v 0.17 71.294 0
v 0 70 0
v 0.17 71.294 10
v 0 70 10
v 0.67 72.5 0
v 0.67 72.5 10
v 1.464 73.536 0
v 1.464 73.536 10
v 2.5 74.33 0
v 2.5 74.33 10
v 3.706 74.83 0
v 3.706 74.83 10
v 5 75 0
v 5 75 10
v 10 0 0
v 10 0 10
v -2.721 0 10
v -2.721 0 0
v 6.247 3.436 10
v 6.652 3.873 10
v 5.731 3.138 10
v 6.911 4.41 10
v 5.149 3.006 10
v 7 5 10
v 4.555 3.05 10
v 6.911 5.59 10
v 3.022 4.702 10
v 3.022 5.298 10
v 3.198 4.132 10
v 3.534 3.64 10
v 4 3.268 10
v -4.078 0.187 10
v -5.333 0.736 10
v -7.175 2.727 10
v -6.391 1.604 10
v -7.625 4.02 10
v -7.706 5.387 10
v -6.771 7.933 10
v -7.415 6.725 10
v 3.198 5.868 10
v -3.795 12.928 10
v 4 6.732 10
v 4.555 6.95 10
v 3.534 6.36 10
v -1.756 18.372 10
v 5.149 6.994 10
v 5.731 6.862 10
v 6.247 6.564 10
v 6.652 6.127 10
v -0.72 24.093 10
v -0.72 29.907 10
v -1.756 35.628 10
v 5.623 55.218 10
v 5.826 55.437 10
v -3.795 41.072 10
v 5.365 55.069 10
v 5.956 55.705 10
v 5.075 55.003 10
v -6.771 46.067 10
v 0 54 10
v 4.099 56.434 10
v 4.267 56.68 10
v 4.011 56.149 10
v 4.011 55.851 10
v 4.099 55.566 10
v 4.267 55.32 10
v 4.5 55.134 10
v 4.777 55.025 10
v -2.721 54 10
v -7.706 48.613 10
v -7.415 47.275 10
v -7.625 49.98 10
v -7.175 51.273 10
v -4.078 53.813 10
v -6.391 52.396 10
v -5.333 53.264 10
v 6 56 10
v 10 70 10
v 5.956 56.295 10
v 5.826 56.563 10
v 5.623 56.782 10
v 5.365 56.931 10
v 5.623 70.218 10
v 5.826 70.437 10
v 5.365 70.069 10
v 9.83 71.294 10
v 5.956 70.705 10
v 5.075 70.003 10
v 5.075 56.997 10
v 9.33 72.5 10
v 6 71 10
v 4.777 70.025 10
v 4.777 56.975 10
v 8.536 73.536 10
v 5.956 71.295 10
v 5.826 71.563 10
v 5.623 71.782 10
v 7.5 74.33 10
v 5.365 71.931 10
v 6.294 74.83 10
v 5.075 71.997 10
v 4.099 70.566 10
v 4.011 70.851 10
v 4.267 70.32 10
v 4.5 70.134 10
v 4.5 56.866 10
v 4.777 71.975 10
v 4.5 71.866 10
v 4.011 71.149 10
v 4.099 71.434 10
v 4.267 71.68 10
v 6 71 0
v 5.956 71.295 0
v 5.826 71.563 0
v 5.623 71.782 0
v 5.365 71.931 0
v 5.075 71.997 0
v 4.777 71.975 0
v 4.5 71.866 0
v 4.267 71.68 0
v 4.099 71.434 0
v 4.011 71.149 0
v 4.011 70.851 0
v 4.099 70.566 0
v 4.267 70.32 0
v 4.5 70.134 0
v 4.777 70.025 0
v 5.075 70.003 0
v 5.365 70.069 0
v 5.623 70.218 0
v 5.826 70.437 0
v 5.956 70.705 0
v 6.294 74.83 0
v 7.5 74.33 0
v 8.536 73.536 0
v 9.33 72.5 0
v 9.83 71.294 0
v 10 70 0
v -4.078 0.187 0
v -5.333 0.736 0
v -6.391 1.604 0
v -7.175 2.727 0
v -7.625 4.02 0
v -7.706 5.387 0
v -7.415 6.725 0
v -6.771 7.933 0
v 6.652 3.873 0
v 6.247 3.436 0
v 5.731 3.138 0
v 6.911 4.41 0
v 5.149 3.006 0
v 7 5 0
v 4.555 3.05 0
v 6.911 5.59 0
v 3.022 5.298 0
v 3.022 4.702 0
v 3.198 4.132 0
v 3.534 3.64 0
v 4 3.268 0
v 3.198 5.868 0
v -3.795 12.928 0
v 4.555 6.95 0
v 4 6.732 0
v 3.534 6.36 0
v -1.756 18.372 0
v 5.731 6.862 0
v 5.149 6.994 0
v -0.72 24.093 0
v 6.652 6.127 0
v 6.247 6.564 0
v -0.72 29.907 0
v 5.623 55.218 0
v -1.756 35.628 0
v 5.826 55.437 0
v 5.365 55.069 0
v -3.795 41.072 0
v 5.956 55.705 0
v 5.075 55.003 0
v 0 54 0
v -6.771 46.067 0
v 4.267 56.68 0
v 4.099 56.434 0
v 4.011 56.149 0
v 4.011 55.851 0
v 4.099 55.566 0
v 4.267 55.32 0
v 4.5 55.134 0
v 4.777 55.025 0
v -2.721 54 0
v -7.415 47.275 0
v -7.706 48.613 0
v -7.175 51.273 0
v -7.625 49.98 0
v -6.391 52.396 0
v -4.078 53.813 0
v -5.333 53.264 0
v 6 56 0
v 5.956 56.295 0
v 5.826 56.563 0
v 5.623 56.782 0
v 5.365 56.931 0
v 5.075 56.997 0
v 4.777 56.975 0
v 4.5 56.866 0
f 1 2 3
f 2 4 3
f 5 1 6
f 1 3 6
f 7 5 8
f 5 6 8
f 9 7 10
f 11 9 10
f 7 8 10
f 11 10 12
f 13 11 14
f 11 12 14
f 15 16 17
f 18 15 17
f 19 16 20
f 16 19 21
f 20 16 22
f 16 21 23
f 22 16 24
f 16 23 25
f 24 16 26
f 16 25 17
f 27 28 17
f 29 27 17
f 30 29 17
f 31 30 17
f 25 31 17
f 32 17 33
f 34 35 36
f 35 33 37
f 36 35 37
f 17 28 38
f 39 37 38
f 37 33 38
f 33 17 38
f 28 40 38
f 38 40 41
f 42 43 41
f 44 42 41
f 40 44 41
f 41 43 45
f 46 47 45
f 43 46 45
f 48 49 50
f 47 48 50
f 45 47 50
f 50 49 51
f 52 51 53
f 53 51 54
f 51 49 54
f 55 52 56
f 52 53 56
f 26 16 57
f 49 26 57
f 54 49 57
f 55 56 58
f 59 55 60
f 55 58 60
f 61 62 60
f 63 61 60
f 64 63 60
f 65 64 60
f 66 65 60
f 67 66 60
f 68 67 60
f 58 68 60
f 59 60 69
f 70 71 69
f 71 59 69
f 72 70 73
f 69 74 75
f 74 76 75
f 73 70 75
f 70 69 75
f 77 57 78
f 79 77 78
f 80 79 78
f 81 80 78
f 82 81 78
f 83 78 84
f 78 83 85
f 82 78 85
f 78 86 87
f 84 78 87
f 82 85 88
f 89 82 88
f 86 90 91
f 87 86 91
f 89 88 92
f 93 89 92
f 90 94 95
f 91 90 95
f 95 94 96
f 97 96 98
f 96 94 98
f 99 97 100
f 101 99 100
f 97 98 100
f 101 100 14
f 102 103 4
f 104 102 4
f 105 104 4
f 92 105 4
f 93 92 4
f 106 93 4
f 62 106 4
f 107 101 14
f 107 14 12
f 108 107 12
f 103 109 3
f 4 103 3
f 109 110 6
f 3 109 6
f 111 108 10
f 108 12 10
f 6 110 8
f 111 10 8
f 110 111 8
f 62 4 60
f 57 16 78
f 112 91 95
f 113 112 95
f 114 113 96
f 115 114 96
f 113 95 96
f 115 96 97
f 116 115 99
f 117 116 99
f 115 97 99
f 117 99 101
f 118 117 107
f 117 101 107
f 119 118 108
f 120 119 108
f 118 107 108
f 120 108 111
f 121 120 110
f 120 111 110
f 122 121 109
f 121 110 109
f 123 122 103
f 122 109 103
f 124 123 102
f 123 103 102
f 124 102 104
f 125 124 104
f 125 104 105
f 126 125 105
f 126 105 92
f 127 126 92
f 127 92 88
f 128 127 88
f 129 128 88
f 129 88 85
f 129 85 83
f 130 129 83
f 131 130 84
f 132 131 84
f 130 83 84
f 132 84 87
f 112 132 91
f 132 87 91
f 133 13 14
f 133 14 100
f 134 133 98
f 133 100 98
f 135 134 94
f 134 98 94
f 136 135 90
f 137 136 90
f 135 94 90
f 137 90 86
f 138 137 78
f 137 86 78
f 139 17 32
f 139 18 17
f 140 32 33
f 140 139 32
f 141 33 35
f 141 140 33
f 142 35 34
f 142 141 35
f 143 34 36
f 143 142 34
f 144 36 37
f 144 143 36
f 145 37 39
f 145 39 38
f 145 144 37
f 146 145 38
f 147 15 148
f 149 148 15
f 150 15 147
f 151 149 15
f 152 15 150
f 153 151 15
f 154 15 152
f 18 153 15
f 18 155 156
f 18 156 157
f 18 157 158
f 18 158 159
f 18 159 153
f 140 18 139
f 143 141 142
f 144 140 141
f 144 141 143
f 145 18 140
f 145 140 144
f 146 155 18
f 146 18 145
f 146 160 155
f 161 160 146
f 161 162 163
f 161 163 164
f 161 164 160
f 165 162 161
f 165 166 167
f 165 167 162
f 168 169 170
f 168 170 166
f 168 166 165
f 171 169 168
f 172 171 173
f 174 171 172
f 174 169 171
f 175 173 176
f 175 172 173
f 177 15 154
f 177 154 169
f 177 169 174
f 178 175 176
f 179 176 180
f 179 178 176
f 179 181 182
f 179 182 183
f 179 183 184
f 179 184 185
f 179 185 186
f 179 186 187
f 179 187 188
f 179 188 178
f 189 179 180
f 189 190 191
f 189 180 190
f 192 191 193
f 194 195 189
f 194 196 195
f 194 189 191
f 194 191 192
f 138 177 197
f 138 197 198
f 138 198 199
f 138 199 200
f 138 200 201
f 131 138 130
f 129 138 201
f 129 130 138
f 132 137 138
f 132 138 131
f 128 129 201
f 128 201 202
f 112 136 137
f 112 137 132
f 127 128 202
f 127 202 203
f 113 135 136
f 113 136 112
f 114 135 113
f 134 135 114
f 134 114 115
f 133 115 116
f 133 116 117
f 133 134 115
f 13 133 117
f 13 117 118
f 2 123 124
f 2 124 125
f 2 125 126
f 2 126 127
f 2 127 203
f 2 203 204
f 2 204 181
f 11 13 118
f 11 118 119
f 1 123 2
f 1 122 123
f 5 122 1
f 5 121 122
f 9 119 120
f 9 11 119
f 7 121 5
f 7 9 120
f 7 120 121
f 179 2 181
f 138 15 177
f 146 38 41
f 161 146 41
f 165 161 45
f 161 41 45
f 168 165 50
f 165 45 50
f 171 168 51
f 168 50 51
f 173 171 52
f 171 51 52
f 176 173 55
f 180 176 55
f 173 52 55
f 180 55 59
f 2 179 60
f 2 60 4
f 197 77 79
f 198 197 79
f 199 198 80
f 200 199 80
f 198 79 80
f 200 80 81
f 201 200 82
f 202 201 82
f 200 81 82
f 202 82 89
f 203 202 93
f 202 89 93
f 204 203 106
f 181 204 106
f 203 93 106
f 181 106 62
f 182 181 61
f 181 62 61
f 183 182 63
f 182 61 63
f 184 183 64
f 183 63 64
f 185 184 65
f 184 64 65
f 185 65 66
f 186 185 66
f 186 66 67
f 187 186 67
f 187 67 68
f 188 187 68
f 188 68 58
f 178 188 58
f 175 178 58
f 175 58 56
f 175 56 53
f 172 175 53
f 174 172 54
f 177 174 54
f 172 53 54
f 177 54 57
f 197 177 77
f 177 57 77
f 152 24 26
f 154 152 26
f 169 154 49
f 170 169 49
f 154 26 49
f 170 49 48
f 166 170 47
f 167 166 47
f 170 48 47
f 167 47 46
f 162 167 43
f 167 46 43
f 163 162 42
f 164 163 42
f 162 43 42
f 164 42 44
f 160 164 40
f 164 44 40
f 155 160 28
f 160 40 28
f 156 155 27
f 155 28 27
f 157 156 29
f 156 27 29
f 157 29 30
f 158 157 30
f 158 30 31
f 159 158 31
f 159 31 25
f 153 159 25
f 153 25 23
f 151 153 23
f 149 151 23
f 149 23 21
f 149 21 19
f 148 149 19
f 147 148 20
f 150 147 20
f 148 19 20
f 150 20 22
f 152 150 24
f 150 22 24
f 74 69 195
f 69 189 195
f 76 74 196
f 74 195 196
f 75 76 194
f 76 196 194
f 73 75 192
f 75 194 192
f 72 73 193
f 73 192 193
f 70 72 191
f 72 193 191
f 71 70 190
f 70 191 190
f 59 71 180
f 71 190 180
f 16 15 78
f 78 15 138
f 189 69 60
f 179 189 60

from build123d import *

# Parameters (mm, degrees)
ESQUISSE1_W             = 10
ESQUISSE1_H             = 75
BOSS_EXTRU_1_DEPTH      = 10
ESQUISSE2_R             = 1
ESQUISSE2_R_2           = 2
ENL_V_MAT_EXTRU_1_DEPTH = 10
CONG_1_R                = 5
BOSS_EXTRU_2_DEPTH      = 10
CONG_2_R                = 5


with BuildPart() as part:
    # Esquisse1 → Boss.-Extru.1 (new body)
    with BuildSketch(Plane.XY):
        with Locations((5, 37.5)):
            Rectangle(ESQUISSE1_W, ESQUISSE1_H)
    extrude(amount=BOSS_EXTRU_1_DEPTH)

    # Esquisse2 → Enlèv. mat.-Extru.1 (cut)
    with BuildSketch(Plane.XY.offset(10)):
        with Locations((5, 56)):
            Circle(ESQUISSE2_R)
        with Locations((5, 71)):
            Circle(ESQUISSE2_R)
        with Locations((5, 5)):
            Circle(ESQUISSE2_R_2)
    extrude(amount=-ENL_V_MAT_EXTRU_1_DEPTH, mode=Mode.SUBTRACT)

    # Congé1
    cong_1_edges = [part.edges().sort_by_distance(p)[0] for p in [
        (10, 75, 5),
        (0, 75, 5),
    ]]
    fillet(cong_1_edges, radius=CONG_1_R - 0.0001)  # a hair under: the kernel refuses the full size

    # Esquisse3 → Boss.-Extru.2 (add)
    with BuildSketch(Plane.XY.offset(10)):
        with BuildLine():
            Line((0, 0), (-15, 0))
            ThreePointArc((-15, 0), (-0.590052515, 27), (-15, 54))
            Line((-15, 54), (0, 54))
            Line((0, 54), (0, 0))
        make_face()
    extrude(amount=-BOSS_EXTRU_2_DEPTH)

    # Congé2
    cong_2_edges = [part.edges().sort_by_distance(p)[0] for p in [
        (-15, 0, 5),
        (-15, 54, 5),
    ]]
    fillet(cong_2_edges, radius=CONG_2_R)


solid = part.part
